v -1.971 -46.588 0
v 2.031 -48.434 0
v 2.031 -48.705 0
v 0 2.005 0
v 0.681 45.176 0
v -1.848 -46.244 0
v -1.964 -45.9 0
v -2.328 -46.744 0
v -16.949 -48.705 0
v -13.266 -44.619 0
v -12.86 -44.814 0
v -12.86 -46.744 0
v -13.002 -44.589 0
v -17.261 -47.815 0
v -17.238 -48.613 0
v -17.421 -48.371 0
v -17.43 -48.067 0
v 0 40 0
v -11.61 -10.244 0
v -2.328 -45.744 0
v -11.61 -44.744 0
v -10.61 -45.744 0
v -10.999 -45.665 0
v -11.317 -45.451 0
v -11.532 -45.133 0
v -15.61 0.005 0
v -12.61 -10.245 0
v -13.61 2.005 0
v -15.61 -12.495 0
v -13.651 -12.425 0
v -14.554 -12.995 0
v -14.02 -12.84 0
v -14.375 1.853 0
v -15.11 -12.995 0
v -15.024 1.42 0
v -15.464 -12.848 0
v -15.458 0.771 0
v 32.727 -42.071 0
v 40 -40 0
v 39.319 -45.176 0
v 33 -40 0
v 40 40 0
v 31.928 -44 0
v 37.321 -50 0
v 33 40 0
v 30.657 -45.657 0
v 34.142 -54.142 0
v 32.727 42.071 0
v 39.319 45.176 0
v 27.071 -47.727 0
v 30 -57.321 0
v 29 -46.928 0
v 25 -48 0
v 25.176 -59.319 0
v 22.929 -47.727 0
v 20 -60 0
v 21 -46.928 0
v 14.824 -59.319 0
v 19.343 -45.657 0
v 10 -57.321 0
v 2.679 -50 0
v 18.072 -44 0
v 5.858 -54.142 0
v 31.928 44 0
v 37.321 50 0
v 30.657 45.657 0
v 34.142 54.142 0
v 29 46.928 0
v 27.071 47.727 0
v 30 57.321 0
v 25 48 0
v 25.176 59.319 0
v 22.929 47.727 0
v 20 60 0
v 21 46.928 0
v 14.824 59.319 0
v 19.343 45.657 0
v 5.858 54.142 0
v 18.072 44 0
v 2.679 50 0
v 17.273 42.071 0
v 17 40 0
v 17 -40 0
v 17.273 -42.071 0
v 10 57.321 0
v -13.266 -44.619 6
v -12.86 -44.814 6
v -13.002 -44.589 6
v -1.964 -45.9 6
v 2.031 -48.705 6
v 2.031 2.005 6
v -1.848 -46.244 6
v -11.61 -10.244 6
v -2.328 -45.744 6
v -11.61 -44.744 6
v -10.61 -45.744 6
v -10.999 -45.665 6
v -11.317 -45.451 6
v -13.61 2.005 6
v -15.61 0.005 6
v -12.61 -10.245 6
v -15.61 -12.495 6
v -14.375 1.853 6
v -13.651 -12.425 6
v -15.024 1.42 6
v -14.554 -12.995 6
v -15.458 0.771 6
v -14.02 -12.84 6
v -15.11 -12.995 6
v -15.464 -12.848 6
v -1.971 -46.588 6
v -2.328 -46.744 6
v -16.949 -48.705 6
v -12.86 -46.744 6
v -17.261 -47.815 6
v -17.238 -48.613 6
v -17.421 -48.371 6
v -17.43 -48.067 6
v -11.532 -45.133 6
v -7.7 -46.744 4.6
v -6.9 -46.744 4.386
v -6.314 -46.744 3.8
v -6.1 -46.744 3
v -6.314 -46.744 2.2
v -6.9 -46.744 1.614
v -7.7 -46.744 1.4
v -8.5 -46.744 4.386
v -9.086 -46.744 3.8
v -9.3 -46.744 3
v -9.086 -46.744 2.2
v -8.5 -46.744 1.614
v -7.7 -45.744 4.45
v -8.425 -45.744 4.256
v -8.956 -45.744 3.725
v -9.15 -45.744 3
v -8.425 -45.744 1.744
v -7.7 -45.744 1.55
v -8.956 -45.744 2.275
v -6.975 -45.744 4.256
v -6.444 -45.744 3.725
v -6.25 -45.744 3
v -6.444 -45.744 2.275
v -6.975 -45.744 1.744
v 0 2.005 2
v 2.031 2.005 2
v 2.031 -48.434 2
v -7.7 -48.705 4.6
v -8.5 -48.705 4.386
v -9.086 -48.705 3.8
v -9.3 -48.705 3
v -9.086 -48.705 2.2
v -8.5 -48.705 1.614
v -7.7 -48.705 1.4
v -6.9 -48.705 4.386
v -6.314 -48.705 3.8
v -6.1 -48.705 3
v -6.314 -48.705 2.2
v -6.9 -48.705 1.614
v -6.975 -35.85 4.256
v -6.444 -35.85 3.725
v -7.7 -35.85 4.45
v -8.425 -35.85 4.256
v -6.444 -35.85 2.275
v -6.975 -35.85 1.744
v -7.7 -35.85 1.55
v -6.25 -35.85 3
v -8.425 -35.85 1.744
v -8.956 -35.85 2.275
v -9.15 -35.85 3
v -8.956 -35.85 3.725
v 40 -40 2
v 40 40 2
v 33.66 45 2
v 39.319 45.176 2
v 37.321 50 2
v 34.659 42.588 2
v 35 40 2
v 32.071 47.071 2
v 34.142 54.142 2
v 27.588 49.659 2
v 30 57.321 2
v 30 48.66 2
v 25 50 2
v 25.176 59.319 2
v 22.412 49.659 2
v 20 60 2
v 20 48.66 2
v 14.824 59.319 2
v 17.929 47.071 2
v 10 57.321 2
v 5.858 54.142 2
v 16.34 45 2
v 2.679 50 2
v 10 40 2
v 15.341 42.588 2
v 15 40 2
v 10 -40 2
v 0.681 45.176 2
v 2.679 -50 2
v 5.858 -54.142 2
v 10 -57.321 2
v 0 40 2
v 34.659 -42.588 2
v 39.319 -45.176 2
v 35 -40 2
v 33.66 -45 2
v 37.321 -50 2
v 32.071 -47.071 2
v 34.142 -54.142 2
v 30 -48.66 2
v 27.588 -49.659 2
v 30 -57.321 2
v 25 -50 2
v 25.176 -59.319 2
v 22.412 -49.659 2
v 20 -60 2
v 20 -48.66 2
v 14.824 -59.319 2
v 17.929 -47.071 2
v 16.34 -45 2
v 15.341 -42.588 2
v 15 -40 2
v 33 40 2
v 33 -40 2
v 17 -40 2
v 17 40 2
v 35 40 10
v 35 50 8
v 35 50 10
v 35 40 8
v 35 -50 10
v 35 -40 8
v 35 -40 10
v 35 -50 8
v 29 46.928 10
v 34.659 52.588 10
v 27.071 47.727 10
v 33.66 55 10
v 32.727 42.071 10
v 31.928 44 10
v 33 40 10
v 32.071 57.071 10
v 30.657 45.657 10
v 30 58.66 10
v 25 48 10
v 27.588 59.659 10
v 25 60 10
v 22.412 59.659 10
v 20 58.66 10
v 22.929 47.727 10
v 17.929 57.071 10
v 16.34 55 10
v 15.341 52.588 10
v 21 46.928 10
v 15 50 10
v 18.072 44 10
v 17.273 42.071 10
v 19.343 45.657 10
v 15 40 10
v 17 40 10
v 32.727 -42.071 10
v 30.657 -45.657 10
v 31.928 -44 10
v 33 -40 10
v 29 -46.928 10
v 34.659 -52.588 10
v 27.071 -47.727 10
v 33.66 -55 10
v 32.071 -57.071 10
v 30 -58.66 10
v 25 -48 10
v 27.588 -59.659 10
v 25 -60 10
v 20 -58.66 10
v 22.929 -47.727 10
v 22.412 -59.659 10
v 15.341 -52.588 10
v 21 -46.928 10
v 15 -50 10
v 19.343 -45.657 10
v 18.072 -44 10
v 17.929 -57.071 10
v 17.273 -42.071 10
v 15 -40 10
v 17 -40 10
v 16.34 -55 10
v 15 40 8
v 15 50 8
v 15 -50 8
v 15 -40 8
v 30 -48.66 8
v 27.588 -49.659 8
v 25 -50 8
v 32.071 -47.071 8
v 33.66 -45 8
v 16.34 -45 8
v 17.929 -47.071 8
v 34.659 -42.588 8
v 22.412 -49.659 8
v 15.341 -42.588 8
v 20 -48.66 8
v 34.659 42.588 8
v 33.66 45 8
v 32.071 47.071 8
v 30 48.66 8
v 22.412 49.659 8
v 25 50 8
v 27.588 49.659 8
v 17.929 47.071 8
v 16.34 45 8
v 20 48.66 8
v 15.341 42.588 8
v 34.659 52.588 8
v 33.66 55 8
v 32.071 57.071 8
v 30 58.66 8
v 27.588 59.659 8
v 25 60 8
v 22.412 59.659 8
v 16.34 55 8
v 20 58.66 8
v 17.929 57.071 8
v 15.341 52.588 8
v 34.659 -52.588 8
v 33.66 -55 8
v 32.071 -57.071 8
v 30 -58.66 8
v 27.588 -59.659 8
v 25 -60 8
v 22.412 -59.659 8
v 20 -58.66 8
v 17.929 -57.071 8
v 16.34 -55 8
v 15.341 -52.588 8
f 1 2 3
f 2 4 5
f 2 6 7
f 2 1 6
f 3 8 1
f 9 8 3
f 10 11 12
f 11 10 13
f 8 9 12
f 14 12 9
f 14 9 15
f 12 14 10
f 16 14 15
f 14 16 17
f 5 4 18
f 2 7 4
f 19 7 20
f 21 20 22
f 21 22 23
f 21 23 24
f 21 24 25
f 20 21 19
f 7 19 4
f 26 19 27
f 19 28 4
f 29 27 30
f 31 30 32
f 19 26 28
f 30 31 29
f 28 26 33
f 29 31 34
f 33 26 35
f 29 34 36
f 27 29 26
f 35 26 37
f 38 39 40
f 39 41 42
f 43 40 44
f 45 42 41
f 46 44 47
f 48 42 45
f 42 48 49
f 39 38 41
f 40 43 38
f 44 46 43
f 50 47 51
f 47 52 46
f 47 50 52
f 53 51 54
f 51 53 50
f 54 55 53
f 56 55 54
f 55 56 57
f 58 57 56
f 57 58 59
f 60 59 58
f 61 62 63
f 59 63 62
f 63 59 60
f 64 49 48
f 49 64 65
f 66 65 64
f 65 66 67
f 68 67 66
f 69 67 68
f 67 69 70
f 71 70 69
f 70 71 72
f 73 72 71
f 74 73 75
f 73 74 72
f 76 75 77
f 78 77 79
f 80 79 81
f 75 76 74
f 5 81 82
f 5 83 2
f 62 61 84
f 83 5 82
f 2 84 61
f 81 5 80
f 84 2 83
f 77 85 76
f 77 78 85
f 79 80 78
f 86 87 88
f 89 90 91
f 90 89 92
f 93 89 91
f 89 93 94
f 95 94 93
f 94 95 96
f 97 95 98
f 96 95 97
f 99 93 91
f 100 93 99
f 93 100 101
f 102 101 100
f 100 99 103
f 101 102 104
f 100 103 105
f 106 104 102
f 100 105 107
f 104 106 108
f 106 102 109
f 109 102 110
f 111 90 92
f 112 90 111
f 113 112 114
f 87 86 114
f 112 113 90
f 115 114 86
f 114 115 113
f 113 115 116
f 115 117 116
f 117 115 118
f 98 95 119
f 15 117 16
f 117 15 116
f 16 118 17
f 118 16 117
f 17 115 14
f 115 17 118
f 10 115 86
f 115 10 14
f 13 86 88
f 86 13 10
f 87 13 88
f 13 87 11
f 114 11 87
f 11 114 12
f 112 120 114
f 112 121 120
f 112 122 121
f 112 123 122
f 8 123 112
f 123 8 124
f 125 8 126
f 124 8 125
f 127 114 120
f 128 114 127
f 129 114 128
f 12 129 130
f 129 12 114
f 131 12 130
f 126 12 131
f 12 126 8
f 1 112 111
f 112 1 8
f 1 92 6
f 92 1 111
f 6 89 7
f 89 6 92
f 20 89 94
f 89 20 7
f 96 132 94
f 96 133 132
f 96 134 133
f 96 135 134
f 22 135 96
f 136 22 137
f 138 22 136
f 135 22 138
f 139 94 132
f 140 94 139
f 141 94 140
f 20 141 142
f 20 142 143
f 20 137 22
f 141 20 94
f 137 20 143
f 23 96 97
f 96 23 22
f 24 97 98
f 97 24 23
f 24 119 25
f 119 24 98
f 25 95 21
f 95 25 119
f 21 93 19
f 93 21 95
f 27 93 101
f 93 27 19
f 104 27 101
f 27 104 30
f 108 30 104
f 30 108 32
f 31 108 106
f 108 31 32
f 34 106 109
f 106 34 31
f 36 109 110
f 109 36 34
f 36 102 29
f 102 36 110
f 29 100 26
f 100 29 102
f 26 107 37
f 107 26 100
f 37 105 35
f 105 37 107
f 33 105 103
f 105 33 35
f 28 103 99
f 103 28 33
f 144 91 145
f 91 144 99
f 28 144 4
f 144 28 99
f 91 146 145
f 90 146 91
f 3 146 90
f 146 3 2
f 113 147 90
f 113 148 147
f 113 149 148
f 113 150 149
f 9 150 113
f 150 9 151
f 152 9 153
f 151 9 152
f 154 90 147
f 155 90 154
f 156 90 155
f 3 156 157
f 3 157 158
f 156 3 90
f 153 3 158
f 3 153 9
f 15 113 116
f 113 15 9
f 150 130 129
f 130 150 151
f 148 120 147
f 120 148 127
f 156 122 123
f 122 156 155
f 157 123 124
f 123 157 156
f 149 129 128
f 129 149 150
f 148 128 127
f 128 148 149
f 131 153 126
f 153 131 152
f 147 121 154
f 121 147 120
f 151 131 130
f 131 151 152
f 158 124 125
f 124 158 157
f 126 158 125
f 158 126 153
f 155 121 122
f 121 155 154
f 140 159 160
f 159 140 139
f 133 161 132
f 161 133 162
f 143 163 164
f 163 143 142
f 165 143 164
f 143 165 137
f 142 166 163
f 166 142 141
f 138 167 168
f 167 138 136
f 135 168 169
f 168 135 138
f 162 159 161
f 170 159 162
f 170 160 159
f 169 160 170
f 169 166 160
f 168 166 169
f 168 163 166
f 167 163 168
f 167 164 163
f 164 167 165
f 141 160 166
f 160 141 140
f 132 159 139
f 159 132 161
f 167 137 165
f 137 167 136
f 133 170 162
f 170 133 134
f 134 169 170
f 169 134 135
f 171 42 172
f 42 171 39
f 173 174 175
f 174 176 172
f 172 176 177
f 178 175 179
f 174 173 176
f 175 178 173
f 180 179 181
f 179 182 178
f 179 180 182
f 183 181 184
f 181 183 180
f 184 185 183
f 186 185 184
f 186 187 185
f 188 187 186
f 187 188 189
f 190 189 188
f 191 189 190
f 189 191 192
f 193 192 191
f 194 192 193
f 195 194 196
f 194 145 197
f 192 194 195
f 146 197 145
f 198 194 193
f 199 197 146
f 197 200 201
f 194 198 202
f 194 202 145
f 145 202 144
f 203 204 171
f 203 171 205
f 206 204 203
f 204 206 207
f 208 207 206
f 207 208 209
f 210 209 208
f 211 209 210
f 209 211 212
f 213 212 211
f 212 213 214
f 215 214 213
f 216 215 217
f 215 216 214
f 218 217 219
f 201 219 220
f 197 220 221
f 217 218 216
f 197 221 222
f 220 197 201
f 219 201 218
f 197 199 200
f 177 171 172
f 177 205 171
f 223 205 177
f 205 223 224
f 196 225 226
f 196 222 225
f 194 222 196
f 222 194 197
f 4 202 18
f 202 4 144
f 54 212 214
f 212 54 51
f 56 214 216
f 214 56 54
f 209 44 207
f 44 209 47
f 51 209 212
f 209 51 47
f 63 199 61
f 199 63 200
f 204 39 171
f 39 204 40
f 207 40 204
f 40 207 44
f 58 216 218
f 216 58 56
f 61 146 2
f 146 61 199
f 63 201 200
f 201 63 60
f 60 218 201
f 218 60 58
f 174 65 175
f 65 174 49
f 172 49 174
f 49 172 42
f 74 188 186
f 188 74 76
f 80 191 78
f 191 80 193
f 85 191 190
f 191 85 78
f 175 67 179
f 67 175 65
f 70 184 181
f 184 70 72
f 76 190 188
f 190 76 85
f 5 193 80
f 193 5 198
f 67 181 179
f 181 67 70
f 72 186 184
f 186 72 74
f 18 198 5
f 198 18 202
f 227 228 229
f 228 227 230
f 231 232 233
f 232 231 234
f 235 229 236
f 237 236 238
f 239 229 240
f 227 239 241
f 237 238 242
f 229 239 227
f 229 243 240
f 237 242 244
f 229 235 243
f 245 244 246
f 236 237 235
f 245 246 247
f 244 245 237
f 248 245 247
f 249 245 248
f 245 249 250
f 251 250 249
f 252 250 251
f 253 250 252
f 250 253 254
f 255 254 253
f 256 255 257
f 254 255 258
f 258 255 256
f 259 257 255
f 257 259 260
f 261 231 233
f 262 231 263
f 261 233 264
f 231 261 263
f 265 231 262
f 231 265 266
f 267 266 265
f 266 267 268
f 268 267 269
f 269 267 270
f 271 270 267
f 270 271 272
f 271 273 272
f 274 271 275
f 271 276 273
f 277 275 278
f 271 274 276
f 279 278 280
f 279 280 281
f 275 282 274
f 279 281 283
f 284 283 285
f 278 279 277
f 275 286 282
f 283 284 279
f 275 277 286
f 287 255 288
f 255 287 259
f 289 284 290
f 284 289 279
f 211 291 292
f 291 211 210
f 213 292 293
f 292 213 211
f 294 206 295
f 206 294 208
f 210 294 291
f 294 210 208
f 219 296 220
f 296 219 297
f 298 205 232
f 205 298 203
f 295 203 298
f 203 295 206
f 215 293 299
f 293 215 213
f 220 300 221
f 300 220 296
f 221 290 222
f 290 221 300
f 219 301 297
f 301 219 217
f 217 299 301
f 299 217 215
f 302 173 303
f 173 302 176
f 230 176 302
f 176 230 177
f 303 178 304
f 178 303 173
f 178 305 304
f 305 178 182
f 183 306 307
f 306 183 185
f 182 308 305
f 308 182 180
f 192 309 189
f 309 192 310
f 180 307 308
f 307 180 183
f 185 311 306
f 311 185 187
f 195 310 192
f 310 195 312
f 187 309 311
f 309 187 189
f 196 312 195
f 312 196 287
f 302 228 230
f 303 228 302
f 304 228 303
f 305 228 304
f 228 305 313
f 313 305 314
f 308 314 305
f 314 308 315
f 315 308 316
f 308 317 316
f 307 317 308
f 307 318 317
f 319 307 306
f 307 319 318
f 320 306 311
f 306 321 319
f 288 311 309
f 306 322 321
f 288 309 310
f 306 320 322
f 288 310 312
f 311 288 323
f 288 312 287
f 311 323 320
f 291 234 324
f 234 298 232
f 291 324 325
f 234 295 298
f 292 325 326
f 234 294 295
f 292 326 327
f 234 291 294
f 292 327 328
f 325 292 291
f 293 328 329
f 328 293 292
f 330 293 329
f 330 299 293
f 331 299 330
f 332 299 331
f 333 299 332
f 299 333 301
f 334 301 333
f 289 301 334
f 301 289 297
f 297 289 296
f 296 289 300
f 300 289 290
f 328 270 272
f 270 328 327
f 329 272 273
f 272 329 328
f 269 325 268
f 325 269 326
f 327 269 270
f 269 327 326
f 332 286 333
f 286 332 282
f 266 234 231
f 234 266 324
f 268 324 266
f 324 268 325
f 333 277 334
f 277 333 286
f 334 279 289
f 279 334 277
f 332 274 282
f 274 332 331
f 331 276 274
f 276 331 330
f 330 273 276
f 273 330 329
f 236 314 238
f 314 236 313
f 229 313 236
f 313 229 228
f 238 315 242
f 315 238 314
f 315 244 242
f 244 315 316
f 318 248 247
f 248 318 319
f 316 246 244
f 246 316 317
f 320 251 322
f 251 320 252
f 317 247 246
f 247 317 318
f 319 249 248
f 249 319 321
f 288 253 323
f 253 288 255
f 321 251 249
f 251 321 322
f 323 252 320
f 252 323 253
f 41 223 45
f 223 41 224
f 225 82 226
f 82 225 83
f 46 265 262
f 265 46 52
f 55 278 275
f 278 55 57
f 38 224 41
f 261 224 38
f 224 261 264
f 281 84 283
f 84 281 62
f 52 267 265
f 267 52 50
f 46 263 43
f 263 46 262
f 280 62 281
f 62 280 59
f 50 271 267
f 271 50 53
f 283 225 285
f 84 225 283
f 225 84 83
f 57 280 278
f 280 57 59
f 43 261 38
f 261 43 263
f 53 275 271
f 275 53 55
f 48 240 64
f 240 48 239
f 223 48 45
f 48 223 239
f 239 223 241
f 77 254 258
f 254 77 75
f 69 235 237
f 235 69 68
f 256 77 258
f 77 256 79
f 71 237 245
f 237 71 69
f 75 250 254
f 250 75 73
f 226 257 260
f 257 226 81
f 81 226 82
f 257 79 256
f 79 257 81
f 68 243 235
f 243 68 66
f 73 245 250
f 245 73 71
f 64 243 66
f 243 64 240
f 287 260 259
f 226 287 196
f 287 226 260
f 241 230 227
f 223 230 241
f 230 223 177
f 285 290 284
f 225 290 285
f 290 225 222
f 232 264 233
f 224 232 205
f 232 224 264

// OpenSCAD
// This work is licensed under a Creative Commons Attribution-ShareAlike 3.0 Unported License.
// https://creativecommons.org/licenses/by-sa/3.0/

height = 120;
width = 40;
depth = 10;
inset = 10;
thickness = 2;

// DIN rail clamp
clampThickness = 6;
// how deep the bolt should go into the solid part, past the spring clip
boltHoleDepth = 10;
// diameter where the bolt passes through the spring clip
looseBoltDiameter = 3.2;
// diameter where the bolt should screw into the DIN holder body
tightBoltDiameter = 2.9;

pocketDepth=0.5;

// DIN rail clamp
// adapted from Thingiverse 101024 by Robert Hunt
// made with 1mm wider opening: my rail is bigger or my printer prints too small
// Dimensions: 19.74 x 51 x clampThickness
module din_clip() {
	$fn = 12;
	difference() {
		linear_extrude(height=clampThickness, convexity=5) {
			// imported Robert's DXF to Inkscape, adjusted, then exported via https://github.com/martymcguire/inkscape-openscad-poly
			polygon(points=
				[[-9.731, 25.355], [5.910, 25.355], [6.675, 25.203], [7.324, 24.770], [7.758, 24.121], [7.910, 23.355], [7.910, 10.855],
				[7.764, 10.502], [7.410, 10.355], [6.854, 10.355], [6.320, 10.510], [5.951, 10.925], [4.910, 13.105], [3.910, 13.106],
				[3.910, -21.394], [3.832, -21.783], [3.617, -22.101], [3.299, -22.315], [2.910, -22.394], [-5.372, -22.394], [-5.736, -22.550],
				[-5.852, -22.894], [-5.729, -23.238], [-5.372, -23.394], [5.160, -23.394], [5.160, -21.464], [5.302, -21.239], [5.566, -21.269],
				[9.561, -24.465], [9.730, -24.717], [9.721, -25.021], [9.538, -25.263], [9.249, -25.355], [-9.731, -25.355]]
				, paths=
				[[0, 1, 2, 3, 4, 5, 6, 7, 8, 9, 10, 11, 12, 13, 14, 15, 16, 17, 18, 19, 20, 21, 22, 23, 24, 25, 26, 27, 28, 29, 30, 31, 32, 33, 0]]
			);
		}
		translate([0, -22.5, clampThickness / 2]) {
			rotate([90, 90, 0]) {
				cylinder(h= boltHoleDepth, r = looseBoltDiameter / 2);
			}
		}
		translate([0, -22.5, clampThickness / 2]) {
			rotate([-90, 90, 0]) {
				cylinder(h= boltHoleDepth, r = tightBoltDiameter / 2);
			}
		}
	}
}
// End of DIN clip by Robert Hunt

module lozenge(l, w, h) {
        union() {
                translate([w / -2, 0, 0])
                        cube([w, l - w, h]);
                translate([0, 0, 0])
                        cylinder(d=w,h=h);
                translate([0, l - w, 0])
                        cylinder(d=w,h=h);
        }
}

module holder() {
	$fn = 24;
	centerCutoutHeight = height - width;
	translate([-9.7 + thickness, pocketDepth - 49.35 + 25.5, 0]) mirror([1, 0, 0]) din_clip();
 	difference() {
		union() {
			translate([width / 2, (height - width) / -2, 0]) lozenge(height, width, thickness);
			translate([inset / 2 + width / 2, (height - width) / -2, 0]) lozenge(height - inset * 2, width - inset * 2, depth);
			translate([inset / 2 + width / 2, (height - width) / -2 - inset, depth - thickness]) lozenge(height, width - inset * 2, thickness);
		}
		translate([width / 2 + inset / 2, (height - width) / -2, -1]) lozenge(height - inset * 2 - thickness * 2, width -  inset * 2 - thickness * 2, depth + 2);
		translate([inset, centerCutoutHeight / -2, thickness]) cube([width, centerCutoutHeight, depth]);
	}
}

holder();
